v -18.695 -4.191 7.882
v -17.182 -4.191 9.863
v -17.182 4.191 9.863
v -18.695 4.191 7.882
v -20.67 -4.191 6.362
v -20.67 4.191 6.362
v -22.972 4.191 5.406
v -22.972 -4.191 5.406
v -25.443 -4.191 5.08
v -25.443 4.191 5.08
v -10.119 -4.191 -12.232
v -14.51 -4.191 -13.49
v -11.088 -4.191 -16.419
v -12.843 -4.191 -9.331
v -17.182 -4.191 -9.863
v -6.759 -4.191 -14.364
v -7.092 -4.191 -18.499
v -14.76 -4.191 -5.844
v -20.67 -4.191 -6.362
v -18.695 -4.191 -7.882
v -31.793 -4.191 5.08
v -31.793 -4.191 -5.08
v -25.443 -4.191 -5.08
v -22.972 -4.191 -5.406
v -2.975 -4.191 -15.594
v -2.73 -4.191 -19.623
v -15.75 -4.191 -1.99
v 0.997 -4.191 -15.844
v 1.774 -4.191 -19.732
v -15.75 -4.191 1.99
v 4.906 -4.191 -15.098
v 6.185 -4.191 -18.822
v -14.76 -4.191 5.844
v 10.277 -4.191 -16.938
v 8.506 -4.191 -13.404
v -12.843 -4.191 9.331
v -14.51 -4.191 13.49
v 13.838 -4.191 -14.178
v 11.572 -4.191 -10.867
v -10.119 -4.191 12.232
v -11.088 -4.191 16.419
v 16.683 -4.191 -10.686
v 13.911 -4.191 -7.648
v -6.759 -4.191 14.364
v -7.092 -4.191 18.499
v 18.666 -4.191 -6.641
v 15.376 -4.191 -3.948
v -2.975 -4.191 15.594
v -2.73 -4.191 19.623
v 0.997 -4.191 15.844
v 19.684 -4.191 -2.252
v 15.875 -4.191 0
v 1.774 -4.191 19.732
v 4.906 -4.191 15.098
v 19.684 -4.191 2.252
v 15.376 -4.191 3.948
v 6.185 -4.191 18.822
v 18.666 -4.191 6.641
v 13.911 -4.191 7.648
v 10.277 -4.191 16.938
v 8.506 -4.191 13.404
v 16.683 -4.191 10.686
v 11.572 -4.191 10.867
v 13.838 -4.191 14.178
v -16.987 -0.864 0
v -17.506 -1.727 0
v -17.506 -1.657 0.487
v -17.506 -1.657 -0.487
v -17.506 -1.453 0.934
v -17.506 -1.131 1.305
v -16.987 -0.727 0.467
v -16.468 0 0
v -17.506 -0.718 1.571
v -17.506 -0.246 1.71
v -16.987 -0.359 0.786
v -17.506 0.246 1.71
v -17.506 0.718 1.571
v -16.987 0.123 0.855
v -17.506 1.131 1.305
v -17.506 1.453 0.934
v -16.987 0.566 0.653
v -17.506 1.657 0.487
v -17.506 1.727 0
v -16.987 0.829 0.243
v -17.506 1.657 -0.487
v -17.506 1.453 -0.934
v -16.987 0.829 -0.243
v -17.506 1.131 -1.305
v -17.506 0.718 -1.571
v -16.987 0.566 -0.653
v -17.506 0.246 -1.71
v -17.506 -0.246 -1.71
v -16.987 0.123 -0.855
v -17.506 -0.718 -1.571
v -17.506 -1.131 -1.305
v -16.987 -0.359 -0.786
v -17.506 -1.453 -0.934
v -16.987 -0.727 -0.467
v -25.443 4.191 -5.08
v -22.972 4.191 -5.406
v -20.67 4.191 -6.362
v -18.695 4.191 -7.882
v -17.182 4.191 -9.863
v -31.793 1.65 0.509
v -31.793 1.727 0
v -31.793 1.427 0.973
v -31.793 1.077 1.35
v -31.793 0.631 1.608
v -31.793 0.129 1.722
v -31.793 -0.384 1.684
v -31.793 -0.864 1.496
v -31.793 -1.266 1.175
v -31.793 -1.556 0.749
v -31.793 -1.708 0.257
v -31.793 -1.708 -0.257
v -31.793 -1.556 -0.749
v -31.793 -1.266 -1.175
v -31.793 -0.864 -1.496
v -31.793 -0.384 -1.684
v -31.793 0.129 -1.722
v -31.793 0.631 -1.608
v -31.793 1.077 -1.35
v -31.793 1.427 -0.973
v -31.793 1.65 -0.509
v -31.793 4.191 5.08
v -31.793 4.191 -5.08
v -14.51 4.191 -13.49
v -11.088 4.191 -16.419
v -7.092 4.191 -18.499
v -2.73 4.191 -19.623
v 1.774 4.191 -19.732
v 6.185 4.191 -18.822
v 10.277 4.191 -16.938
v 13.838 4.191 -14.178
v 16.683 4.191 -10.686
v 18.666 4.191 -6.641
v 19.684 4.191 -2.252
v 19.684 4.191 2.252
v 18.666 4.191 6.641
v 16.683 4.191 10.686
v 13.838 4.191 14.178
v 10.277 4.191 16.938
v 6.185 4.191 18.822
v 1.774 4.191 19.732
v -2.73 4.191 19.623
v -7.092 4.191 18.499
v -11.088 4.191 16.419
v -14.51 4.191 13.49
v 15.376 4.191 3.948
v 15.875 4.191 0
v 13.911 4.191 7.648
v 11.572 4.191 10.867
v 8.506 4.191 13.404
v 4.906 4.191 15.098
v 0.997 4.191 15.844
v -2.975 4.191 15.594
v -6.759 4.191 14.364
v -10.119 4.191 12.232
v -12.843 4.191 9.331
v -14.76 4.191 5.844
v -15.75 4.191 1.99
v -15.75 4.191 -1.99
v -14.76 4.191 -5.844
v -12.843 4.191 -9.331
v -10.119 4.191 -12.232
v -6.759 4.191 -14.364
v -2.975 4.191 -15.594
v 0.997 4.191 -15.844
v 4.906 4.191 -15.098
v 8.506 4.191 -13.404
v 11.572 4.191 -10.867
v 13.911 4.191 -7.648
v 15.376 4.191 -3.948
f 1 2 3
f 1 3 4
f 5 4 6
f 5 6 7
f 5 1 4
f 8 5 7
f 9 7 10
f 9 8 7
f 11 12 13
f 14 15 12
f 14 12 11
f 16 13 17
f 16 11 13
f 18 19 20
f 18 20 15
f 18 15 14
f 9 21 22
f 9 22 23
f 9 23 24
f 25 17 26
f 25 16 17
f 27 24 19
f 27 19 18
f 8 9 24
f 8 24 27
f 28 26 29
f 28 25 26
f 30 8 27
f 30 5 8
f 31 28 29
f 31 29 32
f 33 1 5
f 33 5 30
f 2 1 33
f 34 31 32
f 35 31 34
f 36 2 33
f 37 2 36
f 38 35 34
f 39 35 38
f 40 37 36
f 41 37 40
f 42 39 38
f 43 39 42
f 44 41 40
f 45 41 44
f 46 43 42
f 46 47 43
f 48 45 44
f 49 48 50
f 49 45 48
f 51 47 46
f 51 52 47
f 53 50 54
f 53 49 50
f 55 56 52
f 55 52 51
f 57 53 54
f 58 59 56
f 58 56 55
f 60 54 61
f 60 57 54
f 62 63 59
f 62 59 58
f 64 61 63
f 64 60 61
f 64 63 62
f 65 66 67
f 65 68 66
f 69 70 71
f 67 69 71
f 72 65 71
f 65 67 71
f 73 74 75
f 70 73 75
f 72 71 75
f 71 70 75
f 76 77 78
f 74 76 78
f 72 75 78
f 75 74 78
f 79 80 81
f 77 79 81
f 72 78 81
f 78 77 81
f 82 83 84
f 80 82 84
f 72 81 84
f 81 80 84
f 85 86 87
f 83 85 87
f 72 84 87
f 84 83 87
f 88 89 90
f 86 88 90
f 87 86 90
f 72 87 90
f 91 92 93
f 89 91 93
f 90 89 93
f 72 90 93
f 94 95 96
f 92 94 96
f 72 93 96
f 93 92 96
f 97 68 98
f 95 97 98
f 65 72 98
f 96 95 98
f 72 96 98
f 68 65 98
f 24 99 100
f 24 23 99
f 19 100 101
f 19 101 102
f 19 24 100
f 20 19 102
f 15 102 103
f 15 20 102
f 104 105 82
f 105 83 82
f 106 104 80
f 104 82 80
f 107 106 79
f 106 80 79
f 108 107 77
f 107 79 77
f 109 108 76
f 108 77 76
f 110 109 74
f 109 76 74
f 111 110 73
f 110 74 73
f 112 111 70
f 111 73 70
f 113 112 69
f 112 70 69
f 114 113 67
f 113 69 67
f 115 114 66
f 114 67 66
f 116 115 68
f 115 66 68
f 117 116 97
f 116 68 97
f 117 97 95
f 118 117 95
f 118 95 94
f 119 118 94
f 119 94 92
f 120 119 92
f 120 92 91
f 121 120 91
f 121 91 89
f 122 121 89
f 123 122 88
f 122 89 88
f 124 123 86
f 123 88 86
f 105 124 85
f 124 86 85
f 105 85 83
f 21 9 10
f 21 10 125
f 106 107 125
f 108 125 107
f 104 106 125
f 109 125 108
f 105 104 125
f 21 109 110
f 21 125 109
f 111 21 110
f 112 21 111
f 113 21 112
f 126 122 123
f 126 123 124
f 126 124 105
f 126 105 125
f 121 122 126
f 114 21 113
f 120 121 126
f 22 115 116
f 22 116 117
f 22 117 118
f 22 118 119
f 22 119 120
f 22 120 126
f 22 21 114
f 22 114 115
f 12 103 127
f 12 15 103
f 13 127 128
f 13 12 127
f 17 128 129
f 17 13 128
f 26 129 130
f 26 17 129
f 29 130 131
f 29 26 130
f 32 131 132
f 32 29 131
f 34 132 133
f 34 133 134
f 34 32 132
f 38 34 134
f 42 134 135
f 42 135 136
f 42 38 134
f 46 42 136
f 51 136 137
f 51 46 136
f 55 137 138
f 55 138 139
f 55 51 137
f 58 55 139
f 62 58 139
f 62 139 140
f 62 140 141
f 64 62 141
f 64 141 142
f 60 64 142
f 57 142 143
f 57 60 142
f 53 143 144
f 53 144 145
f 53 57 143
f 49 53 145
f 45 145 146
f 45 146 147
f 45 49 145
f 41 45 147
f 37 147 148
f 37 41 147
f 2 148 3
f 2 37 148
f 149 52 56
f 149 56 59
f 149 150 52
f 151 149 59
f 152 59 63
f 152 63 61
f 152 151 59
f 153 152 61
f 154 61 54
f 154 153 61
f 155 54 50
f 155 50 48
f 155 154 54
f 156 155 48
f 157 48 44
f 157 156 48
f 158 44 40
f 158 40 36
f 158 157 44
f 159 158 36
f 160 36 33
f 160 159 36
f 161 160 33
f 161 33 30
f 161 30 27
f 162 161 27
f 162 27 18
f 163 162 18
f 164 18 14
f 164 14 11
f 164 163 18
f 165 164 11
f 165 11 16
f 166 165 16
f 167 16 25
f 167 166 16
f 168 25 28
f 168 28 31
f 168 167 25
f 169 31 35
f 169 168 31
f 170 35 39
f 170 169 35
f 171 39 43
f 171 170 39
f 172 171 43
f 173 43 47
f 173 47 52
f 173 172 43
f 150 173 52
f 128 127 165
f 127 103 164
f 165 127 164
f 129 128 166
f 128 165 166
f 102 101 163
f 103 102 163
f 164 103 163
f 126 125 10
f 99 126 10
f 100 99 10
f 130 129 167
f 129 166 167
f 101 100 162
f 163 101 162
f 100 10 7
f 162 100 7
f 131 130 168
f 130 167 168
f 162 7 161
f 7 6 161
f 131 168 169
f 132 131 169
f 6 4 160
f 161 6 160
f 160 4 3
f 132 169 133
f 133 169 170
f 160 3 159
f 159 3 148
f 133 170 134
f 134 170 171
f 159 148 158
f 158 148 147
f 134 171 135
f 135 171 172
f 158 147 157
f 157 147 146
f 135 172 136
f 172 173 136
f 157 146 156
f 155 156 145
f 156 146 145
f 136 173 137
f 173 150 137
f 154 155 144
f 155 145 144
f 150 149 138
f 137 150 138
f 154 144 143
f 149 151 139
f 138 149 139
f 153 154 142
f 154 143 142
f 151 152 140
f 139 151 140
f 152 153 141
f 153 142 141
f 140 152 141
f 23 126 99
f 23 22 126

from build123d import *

# Parameters (mm, degrees)
F0_R     = 15.875
F1_DEPTH = 4.191
F3_D     = 3.4544
F3_DEPTH = 14.2875
F3_TIP   = 1.0378064612


with BuildPart() as f1:
    # F0 (on Front) → F1 (new body, symmetric)
    with BuildSketch(Plane.XZ):
        with BuildLine():
            ThreePointArc((-17.1823825283, -9.8631168831), (19.812, 0), (-17.1823825283, 9.8631168831))
            ThreePointArc((-17.1823825283, 9.8631168831), (-20.6703460499, 6.362061759), (-25.4431433593, 5.08))
            Line((-25.4431433593, 5.08), (-31.7931433593, 5.08))
            Line((-31.7931433593, 5.08), (-31.7931433593, -5.08))
            Line((-31.7931433593, -5.08), (-25.4431433593, -5.08))
            ThreePointArc((-25.4431433593, -5.08), (-20.6703460499, -6.362061759), (-17.1823825283, -9.8631168831))
        make_face()
        Circle(F0_R, mode=Mode.SUBTRACT)
    extrude(amount=F1_DEPTH, both=True)

    # F3
    with Locations(Plane(origin=(-31.7931433593, 0, 0), x_dir=(0, -1, 0), z_dir=(-1, 0, 0))):
        with Locations((0, 0)):
            Hole(F3_D / 2, depth=F3_DEPTH)
            with Locations((0, 0, -(F3_DEPTH + F3_TIP / 2))):  # 118° drill point
                Cone(0, F3_D / 2, F3_TIP, mode=Mode.SUBTRACT)


solid = f1.part
